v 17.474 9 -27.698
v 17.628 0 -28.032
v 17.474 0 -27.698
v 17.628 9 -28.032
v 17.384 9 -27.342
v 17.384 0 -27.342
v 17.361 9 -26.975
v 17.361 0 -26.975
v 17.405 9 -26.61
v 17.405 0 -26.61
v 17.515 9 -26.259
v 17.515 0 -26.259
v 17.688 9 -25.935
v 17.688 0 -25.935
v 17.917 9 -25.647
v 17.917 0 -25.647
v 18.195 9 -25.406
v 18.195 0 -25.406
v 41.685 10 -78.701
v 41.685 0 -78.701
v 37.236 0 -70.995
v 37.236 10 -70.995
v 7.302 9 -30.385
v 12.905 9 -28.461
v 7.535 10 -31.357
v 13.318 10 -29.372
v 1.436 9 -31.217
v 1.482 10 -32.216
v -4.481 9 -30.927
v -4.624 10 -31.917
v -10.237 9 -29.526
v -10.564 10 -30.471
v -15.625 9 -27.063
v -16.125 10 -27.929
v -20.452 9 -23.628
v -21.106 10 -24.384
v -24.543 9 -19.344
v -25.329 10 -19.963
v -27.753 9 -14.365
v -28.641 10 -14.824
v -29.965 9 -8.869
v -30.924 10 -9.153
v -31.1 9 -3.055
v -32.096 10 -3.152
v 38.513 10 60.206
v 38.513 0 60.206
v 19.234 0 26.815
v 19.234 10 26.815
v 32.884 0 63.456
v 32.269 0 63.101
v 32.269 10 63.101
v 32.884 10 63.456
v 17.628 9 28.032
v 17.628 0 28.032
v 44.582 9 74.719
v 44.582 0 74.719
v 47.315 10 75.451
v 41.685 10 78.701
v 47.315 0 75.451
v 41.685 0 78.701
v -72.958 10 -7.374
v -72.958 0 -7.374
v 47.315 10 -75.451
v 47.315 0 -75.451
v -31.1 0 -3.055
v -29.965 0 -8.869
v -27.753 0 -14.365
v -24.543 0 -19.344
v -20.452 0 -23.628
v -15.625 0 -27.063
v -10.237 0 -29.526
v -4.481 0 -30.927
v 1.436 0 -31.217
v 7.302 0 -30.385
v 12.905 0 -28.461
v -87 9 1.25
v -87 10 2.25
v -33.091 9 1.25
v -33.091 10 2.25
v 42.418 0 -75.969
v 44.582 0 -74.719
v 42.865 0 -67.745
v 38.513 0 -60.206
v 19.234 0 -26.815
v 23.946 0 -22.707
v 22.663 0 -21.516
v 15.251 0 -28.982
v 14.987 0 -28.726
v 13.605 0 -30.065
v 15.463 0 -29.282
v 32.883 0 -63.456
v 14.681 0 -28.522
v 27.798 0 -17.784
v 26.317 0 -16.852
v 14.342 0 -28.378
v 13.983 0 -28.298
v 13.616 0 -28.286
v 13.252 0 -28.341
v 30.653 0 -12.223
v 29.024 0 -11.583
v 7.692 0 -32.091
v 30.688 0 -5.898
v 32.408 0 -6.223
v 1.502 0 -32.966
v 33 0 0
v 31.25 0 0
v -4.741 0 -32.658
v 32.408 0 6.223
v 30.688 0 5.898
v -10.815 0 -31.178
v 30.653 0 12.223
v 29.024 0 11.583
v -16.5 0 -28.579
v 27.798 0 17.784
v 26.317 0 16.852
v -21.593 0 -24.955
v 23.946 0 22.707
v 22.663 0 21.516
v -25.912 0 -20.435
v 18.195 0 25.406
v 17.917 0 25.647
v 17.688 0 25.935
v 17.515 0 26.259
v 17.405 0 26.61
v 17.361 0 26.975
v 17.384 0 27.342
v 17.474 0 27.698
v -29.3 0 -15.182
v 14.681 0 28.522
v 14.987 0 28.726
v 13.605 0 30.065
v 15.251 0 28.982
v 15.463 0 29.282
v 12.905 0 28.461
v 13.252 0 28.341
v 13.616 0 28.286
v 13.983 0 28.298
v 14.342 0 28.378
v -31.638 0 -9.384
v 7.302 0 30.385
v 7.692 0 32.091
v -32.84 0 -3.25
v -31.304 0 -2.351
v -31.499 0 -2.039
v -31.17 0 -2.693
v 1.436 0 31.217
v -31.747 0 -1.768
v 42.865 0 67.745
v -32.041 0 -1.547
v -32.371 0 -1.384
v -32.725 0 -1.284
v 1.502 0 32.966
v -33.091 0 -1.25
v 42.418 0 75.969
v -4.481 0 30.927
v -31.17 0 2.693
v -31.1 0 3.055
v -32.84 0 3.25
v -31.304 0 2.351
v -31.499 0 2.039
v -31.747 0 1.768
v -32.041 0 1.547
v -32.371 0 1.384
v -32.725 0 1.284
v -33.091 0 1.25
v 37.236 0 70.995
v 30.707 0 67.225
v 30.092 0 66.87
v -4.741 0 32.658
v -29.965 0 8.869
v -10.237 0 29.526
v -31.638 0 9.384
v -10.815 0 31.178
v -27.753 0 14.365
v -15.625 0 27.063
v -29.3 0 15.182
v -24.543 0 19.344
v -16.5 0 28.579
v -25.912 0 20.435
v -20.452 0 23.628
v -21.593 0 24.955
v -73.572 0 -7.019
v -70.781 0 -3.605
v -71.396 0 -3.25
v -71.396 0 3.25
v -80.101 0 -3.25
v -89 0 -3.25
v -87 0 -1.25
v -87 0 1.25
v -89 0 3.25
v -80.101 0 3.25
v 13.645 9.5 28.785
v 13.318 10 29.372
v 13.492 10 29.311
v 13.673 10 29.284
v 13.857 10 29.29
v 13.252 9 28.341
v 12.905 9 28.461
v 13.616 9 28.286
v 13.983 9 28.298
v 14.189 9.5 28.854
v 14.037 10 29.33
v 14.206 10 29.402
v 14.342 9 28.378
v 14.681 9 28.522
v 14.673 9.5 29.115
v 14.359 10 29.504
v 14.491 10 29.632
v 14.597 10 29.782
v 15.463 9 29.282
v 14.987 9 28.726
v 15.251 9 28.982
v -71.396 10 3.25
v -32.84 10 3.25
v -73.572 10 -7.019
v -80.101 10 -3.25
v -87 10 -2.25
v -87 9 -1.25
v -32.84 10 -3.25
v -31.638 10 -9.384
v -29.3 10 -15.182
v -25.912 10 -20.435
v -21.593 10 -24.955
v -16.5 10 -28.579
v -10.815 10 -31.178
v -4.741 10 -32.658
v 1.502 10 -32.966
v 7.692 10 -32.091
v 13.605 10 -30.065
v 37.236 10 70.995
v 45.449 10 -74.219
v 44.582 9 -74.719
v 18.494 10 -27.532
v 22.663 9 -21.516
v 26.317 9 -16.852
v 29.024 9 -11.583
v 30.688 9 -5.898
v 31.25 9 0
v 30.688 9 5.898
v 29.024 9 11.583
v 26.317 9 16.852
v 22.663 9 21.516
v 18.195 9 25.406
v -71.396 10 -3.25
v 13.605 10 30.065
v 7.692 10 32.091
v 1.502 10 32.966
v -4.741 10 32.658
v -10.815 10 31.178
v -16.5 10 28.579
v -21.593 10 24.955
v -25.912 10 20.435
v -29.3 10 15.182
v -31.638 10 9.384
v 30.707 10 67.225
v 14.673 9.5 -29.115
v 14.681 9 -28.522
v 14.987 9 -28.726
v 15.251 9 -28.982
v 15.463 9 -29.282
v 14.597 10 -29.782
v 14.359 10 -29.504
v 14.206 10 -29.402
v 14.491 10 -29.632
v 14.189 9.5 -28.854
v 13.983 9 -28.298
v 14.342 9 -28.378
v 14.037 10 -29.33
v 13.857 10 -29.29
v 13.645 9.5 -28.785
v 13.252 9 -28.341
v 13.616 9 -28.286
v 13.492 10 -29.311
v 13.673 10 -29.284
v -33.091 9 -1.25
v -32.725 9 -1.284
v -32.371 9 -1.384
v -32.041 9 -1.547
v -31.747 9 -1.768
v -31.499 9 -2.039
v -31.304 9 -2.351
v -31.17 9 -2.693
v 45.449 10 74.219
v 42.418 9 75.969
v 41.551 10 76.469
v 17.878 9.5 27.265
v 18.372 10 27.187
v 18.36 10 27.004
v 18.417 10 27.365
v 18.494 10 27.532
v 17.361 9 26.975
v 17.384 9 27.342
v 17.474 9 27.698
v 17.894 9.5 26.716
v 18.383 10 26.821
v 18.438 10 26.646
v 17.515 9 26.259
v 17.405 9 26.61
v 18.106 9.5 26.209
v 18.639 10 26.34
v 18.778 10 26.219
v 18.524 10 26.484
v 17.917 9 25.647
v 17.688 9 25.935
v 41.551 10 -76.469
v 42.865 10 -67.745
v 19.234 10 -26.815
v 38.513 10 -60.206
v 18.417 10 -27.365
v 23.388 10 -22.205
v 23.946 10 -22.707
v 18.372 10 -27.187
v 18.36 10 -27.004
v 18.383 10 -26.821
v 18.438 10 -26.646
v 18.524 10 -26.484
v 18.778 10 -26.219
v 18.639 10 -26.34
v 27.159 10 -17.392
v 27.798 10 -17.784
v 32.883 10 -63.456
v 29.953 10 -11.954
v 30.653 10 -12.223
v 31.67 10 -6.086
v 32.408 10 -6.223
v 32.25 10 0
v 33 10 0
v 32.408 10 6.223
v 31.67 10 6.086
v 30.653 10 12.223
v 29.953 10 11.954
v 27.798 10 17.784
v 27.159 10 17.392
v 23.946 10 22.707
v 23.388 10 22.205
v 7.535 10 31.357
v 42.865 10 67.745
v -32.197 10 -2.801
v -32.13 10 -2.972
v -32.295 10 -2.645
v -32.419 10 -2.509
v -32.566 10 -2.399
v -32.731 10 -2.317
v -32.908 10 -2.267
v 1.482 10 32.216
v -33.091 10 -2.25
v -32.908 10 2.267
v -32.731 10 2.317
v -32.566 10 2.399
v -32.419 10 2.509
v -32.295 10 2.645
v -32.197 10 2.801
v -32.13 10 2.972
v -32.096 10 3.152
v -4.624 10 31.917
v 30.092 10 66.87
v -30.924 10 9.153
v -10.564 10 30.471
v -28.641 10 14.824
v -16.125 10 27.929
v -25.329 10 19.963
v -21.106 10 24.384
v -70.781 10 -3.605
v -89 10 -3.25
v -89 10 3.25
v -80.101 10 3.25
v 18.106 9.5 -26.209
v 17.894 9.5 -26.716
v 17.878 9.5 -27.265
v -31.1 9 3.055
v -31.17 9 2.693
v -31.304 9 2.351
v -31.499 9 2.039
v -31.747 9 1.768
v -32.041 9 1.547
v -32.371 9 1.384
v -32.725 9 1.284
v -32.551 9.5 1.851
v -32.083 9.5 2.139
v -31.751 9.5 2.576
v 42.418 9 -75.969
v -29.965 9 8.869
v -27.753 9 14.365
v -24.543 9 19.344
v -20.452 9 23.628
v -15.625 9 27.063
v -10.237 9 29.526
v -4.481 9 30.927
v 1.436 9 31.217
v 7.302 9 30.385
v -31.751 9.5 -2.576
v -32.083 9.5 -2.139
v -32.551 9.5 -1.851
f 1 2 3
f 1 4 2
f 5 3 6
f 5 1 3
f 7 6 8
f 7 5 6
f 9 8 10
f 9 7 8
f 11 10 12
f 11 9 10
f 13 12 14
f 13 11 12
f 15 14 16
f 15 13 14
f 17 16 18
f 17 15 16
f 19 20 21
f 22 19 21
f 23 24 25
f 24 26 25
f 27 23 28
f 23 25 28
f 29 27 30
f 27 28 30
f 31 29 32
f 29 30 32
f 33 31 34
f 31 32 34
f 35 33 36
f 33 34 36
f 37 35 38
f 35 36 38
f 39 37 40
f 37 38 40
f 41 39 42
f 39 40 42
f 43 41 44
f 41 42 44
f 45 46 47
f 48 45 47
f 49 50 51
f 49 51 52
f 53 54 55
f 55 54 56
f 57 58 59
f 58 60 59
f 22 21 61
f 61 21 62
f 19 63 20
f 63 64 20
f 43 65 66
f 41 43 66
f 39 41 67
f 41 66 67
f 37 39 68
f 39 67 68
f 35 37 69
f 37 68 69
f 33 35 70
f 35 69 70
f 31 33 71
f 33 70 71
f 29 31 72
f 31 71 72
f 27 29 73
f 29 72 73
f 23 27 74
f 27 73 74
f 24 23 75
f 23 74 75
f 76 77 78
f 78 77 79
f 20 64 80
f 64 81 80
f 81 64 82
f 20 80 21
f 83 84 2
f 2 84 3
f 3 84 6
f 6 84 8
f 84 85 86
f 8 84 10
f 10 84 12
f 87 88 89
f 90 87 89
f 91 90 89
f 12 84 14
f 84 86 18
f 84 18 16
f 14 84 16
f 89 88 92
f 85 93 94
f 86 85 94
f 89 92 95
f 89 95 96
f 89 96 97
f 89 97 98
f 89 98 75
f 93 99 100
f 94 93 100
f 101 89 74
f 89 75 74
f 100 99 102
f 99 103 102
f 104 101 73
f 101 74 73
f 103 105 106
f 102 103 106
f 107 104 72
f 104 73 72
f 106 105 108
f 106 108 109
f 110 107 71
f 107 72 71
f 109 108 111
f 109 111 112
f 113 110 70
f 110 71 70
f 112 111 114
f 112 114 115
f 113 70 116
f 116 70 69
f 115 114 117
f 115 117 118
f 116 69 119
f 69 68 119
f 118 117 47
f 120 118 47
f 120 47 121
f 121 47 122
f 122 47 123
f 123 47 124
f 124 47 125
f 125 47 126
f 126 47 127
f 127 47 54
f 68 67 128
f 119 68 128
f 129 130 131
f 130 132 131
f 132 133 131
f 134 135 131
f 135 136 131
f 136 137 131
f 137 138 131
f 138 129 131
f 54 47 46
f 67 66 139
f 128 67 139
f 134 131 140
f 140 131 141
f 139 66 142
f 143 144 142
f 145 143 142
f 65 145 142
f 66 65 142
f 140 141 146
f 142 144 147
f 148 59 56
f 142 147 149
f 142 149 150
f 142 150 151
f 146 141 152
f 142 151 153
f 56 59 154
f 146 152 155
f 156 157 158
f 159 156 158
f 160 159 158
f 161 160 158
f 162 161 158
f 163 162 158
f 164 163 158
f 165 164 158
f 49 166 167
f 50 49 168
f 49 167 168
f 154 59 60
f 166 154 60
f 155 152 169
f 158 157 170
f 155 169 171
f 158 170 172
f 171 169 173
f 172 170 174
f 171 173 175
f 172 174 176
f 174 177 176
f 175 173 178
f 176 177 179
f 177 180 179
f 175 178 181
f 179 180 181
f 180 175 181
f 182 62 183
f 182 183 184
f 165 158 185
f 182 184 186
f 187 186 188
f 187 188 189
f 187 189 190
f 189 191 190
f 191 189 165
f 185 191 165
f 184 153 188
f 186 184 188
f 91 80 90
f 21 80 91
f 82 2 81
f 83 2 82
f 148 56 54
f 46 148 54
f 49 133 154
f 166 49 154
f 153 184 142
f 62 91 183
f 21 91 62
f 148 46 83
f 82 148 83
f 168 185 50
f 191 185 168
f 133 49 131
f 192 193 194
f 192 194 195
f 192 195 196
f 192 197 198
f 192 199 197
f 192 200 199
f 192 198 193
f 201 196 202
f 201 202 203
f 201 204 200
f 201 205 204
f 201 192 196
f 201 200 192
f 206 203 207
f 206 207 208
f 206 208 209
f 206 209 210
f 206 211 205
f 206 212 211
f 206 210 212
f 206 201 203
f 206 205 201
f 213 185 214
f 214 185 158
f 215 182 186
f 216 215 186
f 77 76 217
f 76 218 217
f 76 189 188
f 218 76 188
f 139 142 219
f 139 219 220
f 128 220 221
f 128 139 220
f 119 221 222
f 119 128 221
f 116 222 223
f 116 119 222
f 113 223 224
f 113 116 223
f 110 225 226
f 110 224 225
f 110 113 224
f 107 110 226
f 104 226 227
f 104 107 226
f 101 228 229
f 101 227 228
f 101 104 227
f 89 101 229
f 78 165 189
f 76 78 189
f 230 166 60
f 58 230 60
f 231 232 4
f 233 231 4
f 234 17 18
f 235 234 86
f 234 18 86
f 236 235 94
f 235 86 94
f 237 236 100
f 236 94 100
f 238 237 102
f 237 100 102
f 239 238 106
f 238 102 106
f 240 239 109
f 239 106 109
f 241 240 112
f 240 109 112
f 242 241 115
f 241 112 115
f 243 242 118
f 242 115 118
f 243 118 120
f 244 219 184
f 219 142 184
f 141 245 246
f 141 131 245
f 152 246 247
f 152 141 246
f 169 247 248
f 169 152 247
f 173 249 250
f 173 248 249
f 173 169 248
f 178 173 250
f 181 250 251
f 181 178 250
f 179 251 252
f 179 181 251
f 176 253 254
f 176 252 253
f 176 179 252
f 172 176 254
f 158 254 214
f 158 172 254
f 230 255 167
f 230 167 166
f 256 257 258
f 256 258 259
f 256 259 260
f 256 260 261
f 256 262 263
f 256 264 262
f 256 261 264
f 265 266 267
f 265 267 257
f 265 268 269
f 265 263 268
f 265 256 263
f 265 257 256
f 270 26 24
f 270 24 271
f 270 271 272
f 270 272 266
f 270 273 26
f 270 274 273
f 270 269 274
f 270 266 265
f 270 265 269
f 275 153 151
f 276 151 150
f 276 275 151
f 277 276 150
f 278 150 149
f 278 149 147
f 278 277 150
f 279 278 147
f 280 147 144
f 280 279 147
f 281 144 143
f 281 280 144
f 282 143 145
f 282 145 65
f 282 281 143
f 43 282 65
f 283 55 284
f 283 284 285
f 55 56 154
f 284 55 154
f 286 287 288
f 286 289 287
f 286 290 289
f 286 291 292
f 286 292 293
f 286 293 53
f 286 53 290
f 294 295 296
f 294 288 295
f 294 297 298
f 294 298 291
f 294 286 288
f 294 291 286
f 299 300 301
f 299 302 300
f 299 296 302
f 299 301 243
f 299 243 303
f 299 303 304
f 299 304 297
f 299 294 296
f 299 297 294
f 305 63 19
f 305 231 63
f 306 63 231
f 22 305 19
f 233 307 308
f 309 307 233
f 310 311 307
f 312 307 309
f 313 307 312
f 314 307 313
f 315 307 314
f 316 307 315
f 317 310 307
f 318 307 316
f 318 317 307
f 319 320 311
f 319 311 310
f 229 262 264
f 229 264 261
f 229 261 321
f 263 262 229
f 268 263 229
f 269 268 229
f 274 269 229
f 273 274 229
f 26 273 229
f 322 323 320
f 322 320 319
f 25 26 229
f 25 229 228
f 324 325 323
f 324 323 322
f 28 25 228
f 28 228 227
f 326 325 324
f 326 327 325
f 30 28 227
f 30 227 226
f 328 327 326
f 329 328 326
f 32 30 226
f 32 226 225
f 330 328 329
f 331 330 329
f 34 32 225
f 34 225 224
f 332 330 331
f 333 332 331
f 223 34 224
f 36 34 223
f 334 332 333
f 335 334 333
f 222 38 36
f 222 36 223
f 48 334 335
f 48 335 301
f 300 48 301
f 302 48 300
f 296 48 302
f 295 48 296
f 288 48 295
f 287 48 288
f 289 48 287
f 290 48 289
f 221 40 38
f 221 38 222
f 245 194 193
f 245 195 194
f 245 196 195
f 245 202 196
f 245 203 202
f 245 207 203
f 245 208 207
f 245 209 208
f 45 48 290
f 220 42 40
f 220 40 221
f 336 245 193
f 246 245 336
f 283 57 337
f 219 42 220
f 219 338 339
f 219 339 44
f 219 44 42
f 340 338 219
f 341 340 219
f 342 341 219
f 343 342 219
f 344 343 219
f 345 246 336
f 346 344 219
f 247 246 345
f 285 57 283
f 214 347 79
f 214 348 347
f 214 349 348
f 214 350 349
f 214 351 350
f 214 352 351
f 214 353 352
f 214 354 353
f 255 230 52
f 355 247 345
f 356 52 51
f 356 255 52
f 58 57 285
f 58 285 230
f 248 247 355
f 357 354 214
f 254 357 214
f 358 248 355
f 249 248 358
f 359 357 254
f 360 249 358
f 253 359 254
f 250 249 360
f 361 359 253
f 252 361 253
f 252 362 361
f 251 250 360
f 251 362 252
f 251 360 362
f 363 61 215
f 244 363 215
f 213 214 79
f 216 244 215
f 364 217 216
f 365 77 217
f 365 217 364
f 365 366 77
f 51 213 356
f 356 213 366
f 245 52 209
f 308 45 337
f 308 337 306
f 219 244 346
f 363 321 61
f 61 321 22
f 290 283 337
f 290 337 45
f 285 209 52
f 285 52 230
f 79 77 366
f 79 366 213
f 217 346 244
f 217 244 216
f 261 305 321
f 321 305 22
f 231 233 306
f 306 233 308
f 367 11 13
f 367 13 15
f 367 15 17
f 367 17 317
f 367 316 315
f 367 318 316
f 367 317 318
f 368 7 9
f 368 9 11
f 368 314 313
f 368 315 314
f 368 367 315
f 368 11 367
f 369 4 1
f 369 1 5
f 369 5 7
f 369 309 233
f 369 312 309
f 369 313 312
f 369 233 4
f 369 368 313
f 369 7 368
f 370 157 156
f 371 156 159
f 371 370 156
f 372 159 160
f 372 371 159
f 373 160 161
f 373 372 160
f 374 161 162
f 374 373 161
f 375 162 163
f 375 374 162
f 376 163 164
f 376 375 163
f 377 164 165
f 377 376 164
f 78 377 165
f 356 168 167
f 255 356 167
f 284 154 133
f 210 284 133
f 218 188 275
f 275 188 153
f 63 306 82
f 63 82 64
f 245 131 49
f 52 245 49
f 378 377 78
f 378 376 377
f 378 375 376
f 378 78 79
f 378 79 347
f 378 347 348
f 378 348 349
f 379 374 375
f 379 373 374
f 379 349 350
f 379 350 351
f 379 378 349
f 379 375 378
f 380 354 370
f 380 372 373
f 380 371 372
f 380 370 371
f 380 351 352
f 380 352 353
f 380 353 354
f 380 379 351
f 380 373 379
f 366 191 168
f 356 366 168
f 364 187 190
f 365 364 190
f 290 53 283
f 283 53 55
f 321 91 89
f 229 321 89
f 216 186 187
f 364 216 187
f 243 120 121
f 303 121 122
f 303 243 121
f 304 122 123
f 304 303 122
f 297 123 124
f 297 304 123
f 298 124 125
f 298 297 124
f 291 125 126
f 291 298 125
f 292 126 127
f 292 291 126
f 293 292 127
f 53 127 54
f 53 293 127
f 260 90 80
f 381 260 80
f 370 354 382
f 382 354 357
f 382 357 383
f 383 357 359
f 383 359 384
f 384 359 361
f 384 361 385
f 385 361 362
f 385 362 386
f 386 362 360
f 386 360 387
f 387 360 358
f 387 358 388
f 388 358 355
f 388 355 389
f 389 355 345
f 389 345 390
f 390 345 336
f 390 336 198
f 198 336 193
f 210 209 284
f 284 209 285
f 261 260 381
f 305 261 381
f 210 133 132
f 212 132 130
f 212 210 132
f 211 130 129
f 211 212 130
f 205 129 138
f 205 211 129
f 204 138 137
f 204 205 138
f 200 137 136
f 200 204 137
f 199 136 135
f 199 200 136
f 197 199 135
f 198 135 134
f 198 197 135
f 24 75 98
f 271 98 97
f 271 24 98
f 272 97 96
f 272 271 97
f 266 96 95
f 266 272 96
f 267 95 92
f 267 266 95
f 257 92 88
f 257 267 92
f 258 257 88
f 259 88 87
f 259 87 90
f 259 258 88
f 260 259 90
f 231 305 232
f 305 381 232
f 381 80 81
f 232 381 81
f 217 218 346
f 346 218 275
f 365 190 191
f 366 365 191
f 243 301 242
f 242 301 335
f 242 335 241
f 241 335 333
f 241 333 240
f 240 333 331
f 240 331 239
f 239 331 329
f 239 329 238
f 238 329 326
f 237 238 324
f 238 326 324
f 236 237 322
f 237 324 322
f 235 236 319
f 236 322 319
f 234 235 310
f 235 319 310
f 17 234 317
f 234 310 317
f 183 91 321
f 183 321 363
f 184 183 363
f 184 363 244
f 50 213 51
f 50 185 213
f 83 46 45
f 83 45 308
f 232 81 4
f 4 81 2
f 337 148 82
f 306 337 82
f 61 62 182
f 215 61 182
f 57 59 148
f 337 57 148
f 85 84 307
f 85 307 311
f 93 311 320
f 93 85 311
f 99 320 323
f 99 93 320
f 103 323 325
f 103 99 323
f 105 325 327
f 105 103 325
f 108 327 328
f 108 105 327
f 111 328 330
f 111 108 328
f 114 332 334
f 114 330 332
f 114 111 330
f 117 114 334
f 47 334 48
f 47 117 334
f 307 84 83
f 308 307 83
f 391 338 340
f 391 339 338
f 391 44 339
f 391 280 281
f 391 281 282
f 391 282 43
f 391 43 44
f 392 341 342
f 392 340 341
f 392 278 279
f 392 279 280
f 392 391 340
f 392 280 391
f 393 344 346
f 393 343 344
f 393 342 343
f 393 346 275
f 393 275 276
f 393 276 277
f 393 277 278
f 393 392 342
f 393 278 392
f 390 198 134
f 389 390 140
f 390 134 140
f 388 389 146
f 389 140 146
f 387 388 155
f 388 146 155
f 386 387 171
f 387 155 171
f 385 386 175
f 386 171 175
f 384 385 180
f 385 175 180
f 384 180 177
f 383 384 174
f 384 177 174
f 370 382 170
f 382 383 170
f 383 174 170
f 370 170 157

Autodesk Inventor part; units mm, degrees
ref_plane "YZ Plane" through (0, 0, 0) normal (1, 0, 0) x (0, 1, 0)
ref_plane "XZ Plane" through (0, 0, 0) normal (0, 1, 0) x (-1, 0, 0)
ref_plane "XY Plane" through (0, 0, 0) normal (0, 0, 1) x (1, 0, 0)
sketch "Skizze1" plane through (0, 0, 0) normal (0, 1, 0) x (-1, 0, 0)
  circle A0 centre (0, 0) radius 31.25
  circle A1 centre (0, 0) radius 33
  line L0 (0, 109.2005) -> (0, -98.3382) construction
  line L1 (65.6021, 0) -> (-69.7309, 0) construction
  line L2 (-37.5074, 64.9647) -> (55.9703, -96.9435) construction
  line L3 (-38.0847, -65.9646) -> (43.9559, 76.1338) construction
  line L4 (30, 1.25) -> (87, 1.25)
  line L5 (87, 1.25) -> (87, -1.25)
  line L6 (87, -1.25) -> (30, -1.25)
  line L7 (30, -1.25) -> (30, 1.25)
  line L8 (28, -3.25) -> (89, -3.25)
  line L9 (89, -3.25) -> (89, 3.25)
  line L10 (89, 3.25) -> (28, 3.25)
  line L11 (28, 3.25) -> (28, -3.25)
  line L12 (-16.0825, 25.3558) -> (-44.5825, 74.7192)
  line L13 (-42.4175, 75.9692) -> (-13.9175, 26.6058)
  line L14 (-11.1854, 25.8737) -> (-41.6854, 78.7013)
  line L15 (-47.3146, 75.4513) -> (-16.8146, 22.6237)
  line L16 (-44.5825, 74.7192) -> (-42.4175, 75.9692)
  line L17 (-41.6854, 78.7013) -> (-47.3146, 75.4513)
  line L18 (-13.9175, 26.6058) -> (-16.0825, 25.3558)
  line L19 (-16.8146, 22.6237) -> (-11.1854, 25.8737)
  line L20 (-13.9175, -26.6058) -> (-42.4175, -75.9692)
  line L21 (-44.5825, -74.7192) -> (-16.0825, -25.3558)
  line L22 (-16.8146, -22.6237) -> (-47.3146, -75.4513)
  line L23 (-41.6854, -78.7013) -> (-11.1854, -25.8737)
  line L24 (-42.4175, -75.9692) -> (-44.5825, -74.7192)
  line L25 (-47.3146, -75.4513) -> (-41.6854, -78.7013)
  line L26 (-16.0825, -25.3558) -> (-13.9175, -26.6058)
  line L27 (-11.1854, -25.8737) -> (-16.8146, -22.6237)
  point P0 (-32.8011, 56.8131)
  point P1 (-32.8011, -56.8131)
  point P2 (32.8396, -3.25)
  point P3 (32.8396, 3.25)
  point P4 (-13.6052, 30.0649)
  point P5 (-19.2344, 26.8149)
  point P6 (-19.2344, -26.8149)
  point P7 (-13.6052, -30.0649)
  point P8 (31.225, -1.25)
  point P9 (-14.53, -27.6666)
  point P10 (-16.695, -26.4166)
  point P11 (-16.695, 26.4166)
  point P12 (-14.53, 27.6666)
  point P13 (31.225, 1.25)
  dimension "d0" = 62.5
  dimension "d1" = 66
  dimension "d2" = 120
  dimension "d3" = 120
  dimension "d4" = 2.5
  dimension "d5" = 2
  dimension "d6" = 57
  dimension "d7" = 30
  dimension "d10" = 360
extrude "Extrusion1" add sketch "Skizze1" along normal blind 10 contours A0 L10 A1 L4 | L6 A1 L8 A0 | A0 L14 A1 L10 | A1 L10 L9 L8 L6 L5 L4 | L8 A1 L23 A0 | A0 L13 A1 L14 | L23 A1 L20 A0 | A1 L13 L16 L12 L15 L17 L14 | L23 L25 L22 A1 L21 L24 L20 | A0 L15 A1 L12 | L21 A1 L22 A0 | A0 L22 A1 L15
fillet "Rundung1" radius 2 6 edges at (-31.225, 5, -1.25) (-31.225, 5, 1.25) (14.53, 5, 27.6666) (16.695, 5, 26.4166) (16.695, 5, -26.4166) (14.53, 5, -27.6666)
chamfer "Fase1" distance 1 angle 45 15 edges at (-15.625, 10, -27.0633) (14.3424, 10, -28.3783) (28.9402, 10, -52.6258) (-31.7475, 10, -1.7683) (-60.0454, 10, -1.25) (31.25, 10, 0) (17.4051, 10, 26.61) (31.1052, 10, 51.3758) (17.4051, 10, -26.61) (31.1052, 10, -51.3758) (-15.625, 10, 27.0633) (-31.7475, 10, 1.7683) (-60.0454, 10, 1.25) (14.3424, 10, 28.3783) (28.9402, 10, 52.6258)
sketch "Skizze2" plane through (0, 0, 0) normal (0, 1, 0) x (-1, 0, 0)
  line L0 (-47.3146, 75.4513) -> (-19.2344, 26.8149) projected
  line L1 (-38.5127, 60.2059) -> (-38.5127, -59.496)
  line L2 (-38.5127, -59.496) -> (-38.5127, -60.2059)
  line L3 (-19.2344, -26.8149) -> (-47.3146, -75.4513) projected
  line L4 (-42.8652, 67.7448) -> (-42.8652, -67.7448)
  line L5 (-42.8652, -59.496) -> (-42.8652, -60.2059)
  line L6 (-38.5127, 60.2059) -> (-42.8652, 67.7448)
  line L7 (-38.4567, -60.109) -> (-42.8652, -67.7448)
  line L8 (-32.8835, -63.4559) -> (70.7814, -3.605)
  line L9 (70.7814, -3.605) -> (71.3962, -3.25)
  line L10 (-37.2361, -70.9948) -> (80.1013, -3.25)
  line L11 (72.9577, -7.3744) -> (73.5725, -7.0194)
  line L12 (-32.8835, -63.4559) -> (-37.2361, -70.9948)
  line L13 (71.2843, -3.25) -> (80.1013, -3.25)
  line L14 (71.3962, 3.25) -> (-32.2687, 63.101)
  line L15 (-32.2687, 63.101) -> (-32.8835, 63.4559)
  line L16 (80.1013, 3.25) -> (-37.2361, 70.9948)
  line L17 (-30.0925, 66.8704) -> (-30.7073, 67.2254)
  line L18 (71.3962, 3.25) -> (80.1013, 3.25)
  line L19 (-32.8276, 63.359) -> (-37.2361, 70.9948)
  point P0 (0, 0)
  point P1 (-41.6854, -78.7013)
  point P2 (-13.6052, -30.0649)
  point P3 (32.8396, -3.25)
  point P4 (89, -3.25)
  point P5 (89, 3.25)
  point P6 (32.8396, 3.25)
  point P7 (-13.6052, 30.0649)
  point P8 (-41.6854, 78.7013)
  dimension "d20" = 360
extrude "Extrusion2" add sketch "Skizze2" along normal blind 10
properties part number "_3D-Druck"
